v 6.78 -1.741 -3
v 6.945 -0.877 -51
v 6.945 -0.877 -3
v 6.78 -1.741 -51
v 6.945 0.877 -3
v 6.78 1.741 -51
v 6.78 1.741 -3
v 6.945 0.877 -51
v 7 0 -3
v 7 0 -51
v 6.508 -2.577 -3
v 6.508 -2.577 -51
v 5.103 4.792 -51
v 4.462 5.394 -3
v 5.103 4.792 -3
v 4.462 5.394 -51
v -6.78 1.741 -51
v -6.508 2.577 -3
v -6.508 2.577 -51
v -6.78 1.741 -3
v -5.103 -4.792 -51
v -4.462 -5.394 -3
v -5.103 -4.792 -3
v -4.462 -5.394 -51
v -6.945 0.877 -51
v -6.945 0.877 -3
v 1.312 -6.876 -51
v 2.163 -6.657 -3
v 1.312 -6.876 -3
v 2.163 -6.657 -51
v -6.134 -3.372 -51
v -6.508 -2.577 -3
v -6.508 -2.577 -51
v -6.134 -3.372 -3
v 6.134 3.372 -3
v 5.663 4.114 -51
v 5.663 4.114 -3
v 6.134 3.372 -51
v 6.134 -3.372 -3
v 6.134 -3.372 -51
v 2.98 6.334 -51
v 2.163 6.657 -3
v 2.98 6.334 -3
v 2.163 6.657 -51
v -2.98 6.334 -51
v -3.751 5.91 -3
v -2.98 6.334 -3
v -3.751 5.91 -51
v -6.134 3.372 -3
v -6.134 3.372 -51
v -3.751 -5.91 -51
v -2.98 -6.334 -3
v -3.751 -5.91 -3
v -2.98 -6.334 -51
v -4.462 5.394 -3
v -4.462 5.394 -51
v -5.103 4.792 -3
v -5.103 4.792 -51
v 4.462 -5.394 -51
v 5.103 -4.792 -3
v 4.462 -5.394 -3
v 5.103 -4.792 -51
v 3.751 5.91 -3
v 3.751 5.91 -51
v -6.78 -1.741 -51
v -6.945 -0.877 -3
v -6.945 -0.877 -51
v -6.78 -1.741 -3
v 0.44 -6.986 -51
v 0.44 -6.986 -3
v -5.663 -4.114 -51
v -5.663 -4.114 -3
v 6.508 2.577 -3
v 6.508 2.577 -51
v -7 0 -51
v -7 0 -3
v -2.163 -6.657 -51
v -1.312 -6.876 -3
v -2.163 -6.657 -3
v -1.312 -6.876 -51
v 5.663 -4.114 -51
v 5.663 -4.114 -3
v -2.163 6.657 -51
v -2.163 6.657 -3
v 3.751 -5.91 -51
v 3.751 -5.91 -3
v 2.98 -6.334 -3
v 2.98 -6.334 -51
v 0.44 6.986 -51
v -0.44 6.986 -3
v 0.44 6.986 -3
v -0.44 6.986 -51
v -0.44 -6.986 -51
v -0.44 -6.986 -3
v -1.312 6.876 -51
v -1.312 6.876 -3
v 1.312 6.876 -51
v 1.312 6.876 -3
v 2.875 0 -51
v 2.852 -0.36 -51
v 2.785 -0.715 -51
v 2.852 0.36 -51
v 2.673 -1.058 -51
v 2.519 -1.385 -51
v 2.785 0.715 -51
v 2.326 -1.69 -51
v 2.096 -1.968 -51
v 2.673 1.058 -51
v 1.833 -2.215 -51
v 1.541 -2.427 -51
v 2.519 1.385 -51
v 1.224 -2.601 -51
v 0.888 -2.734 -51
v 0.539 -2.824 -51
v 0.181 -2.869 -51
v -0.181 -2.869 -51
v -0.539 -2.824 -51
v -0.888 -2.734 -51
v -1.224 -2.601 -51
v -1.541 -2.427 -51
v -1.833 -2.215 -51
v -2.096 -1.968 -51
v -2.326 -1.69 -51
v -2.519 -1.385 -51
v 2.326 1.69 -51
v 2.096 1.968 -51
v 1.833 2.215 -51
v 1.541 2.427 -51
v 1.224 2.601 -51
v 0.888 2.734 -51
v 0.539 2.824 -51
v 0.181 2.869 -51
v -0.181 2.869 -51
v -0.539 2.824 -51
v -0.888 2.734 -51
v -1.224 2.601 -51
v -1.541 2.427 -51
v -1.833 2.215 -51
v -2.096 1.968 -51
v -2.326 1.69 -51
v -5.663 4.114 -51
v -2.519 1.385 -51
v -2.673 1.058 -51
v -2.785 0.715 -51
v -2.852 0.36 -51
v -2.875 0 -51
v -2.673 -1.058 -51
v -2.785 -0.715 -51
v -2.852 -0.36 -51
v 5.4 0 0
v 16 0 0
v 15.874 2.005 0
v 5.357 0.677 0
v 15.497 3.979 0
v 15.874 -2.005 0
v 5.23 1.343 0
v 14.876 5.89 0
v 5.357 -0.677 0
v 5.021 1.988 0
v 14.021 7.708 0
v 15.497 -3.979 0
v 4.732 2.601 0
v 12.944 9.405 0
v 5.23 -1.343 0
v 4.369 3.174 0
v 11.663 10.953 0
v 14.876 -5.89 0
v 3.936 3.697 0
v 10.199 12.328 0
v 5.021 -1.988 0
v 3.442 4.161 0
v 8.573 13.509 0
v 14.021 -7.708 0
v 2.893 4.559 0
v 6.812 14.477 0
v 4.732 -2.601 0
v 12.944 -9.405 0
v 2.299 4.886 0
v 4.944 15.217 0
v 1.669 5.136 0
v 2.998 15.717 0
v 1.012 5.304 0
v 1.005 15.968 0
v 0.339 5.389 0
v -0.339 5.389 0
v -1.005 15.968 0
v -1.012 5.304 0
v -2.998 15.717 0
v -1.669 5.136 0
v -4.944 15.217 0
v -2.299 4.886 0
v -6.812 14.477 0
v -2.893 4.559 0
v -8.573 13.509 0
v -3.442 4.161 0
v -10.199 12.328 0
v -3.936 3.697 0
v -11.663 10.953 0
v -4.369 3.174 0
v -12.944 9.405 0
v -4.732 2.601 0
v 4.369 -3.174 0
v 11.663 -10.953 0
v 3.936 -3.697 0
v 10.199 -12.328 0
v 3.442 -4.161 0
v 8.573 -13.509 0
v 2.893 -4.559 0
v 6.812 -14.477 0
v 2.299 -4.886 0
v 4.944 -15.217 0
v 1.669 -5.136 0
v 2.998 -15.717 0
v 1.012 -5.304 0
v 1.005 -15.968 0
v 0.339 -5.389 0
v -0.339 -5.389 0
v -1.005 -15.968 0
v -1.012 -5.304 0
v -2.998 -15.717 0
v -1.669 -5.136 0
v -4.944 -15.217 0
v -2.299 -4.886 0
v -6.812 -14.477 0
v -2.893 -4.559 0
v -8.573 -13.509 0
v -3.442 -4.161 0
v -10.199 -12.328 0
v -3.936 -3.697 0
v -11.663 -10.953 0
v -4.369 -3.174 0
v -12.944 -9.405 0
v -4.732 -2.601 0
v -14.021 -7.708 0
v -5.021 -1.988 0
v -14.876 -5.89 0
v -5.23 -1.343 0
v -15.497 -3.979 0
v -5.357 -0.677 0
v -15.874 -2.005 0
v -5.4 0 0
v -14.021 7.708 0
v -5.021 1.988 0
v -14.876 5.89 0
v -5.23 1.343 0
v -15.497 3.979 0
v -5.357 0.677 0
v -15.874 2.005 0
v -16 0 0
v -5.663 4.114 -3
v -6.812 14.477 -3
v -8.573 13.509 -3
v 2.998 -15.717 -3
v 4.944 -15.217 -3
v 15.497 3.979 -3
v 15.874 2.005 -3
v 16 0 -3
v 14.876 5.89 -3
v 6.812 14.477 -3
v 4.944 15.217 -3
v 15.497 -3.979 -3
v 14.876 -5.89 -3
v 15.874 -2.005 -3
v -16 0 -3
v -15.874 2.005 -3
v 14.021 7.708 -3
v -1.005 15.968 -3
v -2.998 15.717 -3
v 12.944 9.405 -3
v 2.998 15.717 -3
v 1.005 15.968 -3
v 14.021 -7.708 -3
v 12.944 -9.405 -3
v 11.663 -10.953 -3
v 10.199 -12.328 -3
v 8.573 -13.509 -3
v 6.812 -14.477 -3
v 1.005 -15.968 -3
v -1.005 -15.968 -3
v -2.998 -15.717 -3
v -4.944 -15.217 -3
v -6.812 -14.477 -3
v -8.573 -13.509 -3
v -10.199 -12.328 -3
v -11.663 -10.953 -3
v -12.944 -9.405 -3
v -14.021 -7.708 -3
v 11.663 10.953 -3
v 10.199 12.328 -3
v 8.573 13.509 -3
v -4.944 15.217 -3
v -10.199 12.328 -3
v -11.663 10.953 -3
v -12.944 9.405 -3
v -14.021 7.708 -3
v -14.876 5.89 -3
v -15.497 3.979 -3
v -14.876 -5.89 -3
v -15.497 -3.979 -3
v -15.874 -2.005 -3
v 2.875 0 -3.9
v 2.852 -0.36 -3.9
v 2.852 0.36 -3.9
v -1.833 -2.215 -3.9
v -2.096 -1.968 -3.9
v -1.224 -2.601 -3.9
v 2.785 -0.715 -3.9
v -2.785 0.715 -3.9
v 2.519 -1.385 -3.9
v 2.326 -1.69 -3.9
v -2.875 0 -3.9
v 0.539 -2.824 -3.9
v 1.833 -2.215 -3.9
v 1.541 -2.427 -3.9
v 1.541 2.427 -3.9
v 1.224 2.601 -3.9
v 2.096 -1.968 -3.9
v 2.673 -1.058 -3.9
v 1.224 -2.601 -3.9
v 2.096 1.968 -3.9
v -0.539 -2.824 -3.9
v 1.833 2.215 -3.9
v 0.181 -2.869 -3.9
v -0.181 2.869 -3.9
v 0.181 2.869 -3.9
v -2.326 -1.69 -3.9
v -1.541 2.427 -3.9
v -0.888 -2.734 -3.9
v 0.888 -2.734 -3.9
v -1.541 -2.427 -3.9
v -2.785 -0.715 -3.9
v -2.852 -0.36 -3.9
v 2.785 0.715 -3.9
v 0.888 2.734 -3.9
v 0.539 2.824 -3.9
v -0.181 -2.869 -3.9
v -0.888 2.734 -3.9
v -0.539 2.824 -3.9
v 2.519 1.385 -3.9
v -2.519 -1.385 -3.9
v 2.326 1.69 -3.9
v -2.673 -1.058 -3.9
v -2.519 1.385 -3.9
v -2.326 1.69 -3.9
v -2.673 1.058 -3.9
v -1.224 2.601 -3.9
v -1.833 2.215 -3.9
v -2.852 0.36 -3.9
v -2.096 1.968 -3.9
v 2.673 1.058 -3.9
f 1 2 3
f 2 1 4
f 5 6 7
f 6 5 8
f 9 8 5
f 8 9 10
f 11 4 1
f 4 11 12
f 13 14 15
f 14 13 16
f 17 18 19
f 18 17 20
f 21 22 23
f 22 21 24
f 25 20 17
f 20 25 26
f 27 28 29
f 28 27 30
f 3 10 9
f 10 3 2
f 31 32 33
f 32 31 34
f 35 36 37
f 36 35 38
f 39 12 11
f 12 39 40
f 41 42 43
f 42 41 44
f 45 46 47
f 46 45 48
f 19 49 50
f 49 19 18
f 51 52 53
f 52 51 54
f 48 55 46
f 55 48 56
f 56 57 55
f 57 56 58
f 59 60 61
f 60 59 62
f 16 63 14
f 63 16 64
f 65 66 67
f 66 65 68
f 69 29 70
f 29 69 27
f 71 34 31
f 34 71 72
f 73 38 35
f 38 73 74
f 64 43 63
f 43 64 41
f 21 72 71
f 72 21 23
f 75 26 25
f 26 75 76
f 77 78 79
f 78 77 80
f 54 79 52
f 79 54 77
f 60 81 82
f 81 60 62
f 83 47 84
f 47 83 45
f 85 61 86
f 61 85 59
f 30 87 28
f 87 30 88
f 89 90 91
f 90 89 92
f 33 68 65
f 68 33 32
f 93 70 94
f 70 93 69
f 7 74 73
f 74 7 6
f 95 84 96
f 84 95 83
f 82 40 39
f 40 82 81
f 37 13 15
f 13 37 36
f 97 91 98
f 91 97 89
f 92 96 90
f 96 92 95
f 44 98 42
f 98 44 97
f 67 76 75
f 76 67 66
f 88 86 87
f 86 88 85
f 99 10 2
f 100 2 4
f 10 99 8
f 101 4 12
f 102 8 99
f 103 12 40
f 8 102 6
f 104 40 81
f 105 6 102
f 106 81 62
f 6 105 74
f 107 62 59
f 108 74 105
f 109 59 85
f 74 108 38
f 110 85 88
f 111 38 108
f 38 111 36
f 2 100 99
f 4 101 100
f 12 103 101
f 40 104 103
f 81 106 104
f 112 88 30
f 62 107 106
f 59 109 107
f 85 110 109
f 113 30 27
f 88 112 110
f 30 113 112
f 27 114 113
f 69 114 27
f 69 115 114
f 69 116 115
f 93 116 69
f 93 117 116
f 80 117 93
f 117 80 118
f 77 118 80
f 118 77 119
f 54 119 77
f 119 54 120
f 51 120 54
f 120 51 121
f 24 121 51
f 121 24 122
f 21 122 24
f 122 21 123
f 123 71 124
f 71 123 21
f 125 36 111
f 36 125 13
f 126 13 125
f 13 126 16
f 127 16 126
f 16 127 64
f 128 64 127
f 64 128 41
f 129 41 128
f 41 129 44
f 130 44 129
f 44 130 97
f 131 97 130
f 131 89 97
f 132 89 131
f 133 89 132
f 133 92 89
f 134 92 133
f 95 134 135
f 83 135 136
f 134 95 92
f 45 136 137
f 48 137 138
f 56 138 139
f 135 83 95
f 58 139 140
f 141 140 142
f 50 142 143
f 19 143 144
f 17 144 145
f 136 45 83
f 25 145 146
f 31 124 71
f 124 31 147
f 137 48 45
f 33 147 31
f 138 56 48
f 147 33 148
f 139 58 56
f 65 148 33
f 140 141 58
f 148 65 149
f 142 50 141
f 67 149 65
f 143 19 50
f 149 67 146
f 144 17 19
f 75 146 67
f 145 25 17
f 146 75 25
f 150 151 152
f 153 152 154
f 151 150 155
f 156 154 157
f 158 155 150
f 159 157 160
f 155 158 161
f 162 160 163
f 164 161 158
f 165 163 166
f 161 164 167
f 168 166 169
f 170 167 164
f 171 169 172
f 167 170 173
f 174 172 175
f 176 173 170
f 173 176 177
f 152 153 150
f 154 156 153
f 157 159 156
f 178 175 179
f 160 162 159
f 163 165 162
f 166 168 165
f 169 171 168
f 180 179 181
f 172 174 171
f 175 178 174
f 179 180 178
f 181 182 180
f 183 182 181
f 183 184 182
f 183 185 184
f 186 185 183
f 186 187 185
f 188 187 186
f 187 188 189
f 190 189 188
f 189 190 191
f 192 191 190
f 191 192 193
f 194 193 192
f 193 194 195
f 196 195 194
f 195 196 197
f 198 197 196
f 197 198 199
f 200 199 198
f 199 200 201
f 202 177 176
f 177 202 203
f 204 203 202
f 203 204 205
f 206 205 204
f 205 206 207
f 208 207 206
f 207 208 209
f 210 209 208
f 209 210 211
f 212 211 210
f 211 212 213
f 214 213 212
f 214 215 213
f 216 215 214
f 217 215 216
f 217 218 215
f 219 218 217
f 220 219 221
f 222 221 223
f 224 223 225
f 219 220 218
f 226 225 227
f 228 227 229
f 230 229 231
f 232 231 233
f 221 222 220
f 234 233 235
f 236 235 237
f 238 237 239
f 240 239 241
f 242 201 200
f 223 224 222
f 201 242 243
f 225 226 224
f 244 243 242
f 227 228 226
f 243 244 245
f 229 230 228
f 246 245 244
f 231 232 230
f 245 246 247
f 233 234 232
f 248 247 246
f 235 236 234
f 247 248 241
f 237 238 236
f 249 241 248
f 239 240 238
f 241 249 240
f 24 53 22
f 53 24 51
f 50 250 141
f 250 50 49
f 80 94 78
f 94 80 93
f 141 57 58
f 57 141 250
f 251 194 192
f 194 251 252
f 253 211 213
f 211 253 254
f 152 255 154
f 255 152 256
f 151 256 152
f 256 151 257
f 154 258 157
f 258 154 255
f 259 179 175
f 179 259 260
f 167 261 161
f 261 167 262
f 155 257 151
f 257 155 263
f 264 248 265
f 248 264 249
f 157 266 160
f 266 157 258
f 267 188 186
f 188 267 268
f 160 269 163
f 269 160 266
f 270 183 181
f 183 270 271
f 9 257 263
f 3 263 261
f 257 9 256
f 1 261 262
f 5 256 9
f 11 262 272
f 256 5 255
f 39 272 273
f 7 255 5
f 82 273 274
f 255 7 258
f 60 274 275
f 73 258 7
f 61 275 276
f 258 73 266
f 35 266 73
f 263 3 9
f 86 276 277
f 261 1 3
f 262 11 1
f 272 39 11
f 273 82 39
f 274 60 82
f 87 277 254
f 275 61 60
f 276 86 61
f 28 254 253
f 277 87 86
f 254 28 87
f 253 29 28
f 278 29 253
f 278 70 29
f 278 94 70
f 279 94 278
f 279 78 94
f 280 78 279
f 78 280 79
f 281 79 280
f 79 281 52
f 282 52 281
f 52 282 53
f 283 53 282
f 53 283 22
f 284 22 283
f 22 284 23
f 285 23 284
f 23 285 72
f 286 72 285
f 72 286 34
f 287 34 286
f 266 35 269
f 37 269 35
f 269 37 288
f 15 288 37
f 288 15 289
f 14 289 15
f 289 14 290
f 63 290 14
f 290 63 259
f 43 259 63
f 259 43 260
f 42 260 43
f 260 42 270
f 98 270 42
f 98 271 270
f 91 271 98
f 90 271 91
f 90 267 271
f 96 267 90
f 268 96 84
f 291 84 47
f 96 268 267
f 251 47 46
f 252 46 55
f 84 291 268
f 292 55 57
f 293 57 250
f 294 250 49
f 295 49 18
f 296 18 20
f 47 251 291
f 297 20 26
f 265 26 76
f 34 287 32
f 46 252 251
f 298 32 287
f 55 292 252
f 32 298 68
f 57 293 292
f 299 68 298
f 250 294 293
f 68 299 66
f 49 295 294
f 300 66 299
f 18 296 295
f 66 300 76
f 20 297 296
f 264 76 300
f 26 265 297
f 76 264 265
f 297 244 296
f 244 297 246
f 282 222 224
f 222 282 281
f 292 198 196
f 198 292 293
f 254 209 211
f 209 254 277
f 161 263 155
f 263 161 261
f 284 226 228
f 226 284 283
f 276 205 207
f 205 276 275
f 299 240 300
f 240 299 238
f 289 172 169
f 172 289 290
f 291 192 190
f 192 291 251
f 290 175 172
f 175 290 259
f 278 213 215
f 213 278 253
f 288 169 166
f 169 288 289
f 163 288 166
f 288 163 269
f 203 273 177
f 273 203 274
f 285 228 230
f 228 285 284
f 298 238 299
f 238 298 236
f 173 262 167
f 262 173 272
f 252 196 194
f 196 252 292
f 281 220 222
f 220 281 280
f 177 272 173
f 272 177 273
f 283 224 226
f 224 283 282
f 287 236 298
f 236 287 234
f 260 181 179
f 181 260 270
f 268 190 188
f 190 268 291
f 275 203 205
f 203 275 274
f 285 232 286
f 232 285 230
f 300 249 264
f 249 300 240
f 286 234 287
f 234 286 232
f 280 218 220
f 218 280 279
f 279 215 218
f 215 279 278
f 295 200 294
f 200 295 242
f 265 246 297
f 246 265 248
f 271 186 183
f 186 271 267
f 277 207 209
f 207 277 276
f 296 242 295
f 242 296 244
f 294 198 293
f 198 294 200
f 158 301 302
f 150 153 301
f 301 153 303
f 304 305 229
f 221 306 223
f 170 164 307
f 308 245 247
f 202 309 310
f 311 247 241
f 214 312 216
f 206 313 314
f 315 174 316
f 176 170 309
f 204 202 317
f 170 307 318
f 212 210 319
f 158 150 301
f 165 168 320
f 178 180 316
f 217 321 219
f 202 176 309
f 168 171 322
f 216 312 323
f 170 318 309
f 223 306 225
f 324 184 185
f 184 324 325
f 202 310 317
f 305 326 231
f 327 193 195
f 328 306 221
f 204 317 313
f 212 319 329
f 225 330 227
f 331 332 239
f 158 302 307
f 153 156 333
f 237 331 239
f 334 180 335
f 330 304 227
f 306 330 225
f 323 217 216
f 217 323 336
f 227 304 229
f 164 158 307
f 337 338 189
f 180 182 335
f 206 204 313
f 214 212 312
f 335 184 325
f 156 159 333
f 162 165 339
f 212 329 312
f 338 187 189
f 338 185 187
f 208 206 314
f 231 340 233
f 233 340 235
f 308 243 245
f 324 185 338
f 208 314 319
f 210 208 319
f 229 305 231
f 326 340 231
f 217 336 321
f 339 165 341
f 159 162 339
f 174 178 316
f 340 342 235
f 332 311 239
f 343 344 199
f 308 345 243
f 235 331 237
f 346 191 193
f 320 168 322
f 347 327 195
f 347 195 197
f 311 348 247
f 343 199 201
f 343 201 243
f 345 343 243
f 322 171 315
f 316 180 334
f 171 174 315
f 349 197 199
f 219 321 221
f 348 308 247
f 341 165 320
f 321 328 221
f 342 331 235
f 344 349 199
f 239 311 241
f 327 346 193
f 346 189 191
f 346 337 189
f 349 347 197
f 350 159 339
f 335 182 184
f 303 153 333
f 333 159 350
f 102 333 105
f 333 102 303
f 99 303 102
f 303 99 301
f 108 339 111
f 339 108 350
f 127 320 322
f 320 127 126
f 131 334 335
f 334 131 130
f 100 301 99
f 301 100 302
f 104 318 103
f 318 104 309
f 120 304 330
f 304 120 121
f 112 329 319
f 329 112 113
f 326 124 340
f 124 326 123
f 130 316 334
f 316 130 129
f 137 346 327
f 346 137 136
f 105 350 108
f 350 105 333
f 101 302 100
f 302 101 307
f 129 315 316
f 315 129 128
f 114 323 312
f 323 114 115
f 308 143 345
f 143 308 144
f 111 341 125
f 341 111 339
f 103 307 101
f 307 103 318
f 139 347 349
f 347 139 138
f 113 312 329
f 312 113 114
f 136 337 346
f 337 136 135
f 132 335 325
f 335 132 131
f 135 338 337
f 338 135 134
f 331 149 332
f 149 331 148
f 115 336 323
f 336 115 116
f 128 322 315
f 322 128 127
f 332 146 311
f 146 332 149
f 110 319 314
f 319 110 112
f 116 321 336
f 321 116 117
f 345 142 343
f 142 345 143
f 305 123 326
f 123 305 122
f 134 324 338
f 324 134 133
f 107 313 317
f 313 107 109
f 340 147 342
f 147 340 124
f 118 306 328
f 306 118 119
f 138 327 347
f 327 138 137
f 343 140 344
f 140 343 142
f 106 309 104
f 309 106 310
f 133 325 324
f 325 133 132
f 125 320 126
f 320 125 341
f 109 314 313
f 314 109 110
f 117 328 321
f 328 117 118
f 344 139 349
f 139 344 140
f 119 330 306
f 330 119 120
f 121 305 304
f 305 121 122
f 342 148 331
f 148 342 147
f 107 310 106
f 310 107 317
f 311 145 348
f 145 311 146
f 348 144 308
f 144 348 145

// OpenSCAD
$fn = 50;


difference() {
	union() {
		translate(v = [0, 0, -51.0000000000]) {
			cylinder(h = 51, r = 7.0000000000);
		}
		translate(v = [0, 0, -3.0000000000]) {
			cylinder(h = 3, r = 16.0000000000);
		}
	}
	union() {
		translate(v = [0, 0, 0]) {
			rotate(a = [0, 0, 0]) {
				difference() {
					union() {
						#translate(v = [0, 0, -51.0000000000]) {
							cylinder(h = 51, r = 2.6000000000);
						}
						#translate(v = [0, 0, -3.9000000000]) {
							cylinder(h = 3.9000000000, r1 = 2.8750000000, r2 = 5.4000000000);
						}
						#translate(v = [0, 0, -51.0000000000]) {
							cylinder(h = 51, r = 2.8750000000);
						}
						#translate(v = [0, 0, -51.0000000000]) {
							cylinder(h = 51, r = 2.6000000000);
						}
					}
					union();
				}
			}
		}
	}
}
